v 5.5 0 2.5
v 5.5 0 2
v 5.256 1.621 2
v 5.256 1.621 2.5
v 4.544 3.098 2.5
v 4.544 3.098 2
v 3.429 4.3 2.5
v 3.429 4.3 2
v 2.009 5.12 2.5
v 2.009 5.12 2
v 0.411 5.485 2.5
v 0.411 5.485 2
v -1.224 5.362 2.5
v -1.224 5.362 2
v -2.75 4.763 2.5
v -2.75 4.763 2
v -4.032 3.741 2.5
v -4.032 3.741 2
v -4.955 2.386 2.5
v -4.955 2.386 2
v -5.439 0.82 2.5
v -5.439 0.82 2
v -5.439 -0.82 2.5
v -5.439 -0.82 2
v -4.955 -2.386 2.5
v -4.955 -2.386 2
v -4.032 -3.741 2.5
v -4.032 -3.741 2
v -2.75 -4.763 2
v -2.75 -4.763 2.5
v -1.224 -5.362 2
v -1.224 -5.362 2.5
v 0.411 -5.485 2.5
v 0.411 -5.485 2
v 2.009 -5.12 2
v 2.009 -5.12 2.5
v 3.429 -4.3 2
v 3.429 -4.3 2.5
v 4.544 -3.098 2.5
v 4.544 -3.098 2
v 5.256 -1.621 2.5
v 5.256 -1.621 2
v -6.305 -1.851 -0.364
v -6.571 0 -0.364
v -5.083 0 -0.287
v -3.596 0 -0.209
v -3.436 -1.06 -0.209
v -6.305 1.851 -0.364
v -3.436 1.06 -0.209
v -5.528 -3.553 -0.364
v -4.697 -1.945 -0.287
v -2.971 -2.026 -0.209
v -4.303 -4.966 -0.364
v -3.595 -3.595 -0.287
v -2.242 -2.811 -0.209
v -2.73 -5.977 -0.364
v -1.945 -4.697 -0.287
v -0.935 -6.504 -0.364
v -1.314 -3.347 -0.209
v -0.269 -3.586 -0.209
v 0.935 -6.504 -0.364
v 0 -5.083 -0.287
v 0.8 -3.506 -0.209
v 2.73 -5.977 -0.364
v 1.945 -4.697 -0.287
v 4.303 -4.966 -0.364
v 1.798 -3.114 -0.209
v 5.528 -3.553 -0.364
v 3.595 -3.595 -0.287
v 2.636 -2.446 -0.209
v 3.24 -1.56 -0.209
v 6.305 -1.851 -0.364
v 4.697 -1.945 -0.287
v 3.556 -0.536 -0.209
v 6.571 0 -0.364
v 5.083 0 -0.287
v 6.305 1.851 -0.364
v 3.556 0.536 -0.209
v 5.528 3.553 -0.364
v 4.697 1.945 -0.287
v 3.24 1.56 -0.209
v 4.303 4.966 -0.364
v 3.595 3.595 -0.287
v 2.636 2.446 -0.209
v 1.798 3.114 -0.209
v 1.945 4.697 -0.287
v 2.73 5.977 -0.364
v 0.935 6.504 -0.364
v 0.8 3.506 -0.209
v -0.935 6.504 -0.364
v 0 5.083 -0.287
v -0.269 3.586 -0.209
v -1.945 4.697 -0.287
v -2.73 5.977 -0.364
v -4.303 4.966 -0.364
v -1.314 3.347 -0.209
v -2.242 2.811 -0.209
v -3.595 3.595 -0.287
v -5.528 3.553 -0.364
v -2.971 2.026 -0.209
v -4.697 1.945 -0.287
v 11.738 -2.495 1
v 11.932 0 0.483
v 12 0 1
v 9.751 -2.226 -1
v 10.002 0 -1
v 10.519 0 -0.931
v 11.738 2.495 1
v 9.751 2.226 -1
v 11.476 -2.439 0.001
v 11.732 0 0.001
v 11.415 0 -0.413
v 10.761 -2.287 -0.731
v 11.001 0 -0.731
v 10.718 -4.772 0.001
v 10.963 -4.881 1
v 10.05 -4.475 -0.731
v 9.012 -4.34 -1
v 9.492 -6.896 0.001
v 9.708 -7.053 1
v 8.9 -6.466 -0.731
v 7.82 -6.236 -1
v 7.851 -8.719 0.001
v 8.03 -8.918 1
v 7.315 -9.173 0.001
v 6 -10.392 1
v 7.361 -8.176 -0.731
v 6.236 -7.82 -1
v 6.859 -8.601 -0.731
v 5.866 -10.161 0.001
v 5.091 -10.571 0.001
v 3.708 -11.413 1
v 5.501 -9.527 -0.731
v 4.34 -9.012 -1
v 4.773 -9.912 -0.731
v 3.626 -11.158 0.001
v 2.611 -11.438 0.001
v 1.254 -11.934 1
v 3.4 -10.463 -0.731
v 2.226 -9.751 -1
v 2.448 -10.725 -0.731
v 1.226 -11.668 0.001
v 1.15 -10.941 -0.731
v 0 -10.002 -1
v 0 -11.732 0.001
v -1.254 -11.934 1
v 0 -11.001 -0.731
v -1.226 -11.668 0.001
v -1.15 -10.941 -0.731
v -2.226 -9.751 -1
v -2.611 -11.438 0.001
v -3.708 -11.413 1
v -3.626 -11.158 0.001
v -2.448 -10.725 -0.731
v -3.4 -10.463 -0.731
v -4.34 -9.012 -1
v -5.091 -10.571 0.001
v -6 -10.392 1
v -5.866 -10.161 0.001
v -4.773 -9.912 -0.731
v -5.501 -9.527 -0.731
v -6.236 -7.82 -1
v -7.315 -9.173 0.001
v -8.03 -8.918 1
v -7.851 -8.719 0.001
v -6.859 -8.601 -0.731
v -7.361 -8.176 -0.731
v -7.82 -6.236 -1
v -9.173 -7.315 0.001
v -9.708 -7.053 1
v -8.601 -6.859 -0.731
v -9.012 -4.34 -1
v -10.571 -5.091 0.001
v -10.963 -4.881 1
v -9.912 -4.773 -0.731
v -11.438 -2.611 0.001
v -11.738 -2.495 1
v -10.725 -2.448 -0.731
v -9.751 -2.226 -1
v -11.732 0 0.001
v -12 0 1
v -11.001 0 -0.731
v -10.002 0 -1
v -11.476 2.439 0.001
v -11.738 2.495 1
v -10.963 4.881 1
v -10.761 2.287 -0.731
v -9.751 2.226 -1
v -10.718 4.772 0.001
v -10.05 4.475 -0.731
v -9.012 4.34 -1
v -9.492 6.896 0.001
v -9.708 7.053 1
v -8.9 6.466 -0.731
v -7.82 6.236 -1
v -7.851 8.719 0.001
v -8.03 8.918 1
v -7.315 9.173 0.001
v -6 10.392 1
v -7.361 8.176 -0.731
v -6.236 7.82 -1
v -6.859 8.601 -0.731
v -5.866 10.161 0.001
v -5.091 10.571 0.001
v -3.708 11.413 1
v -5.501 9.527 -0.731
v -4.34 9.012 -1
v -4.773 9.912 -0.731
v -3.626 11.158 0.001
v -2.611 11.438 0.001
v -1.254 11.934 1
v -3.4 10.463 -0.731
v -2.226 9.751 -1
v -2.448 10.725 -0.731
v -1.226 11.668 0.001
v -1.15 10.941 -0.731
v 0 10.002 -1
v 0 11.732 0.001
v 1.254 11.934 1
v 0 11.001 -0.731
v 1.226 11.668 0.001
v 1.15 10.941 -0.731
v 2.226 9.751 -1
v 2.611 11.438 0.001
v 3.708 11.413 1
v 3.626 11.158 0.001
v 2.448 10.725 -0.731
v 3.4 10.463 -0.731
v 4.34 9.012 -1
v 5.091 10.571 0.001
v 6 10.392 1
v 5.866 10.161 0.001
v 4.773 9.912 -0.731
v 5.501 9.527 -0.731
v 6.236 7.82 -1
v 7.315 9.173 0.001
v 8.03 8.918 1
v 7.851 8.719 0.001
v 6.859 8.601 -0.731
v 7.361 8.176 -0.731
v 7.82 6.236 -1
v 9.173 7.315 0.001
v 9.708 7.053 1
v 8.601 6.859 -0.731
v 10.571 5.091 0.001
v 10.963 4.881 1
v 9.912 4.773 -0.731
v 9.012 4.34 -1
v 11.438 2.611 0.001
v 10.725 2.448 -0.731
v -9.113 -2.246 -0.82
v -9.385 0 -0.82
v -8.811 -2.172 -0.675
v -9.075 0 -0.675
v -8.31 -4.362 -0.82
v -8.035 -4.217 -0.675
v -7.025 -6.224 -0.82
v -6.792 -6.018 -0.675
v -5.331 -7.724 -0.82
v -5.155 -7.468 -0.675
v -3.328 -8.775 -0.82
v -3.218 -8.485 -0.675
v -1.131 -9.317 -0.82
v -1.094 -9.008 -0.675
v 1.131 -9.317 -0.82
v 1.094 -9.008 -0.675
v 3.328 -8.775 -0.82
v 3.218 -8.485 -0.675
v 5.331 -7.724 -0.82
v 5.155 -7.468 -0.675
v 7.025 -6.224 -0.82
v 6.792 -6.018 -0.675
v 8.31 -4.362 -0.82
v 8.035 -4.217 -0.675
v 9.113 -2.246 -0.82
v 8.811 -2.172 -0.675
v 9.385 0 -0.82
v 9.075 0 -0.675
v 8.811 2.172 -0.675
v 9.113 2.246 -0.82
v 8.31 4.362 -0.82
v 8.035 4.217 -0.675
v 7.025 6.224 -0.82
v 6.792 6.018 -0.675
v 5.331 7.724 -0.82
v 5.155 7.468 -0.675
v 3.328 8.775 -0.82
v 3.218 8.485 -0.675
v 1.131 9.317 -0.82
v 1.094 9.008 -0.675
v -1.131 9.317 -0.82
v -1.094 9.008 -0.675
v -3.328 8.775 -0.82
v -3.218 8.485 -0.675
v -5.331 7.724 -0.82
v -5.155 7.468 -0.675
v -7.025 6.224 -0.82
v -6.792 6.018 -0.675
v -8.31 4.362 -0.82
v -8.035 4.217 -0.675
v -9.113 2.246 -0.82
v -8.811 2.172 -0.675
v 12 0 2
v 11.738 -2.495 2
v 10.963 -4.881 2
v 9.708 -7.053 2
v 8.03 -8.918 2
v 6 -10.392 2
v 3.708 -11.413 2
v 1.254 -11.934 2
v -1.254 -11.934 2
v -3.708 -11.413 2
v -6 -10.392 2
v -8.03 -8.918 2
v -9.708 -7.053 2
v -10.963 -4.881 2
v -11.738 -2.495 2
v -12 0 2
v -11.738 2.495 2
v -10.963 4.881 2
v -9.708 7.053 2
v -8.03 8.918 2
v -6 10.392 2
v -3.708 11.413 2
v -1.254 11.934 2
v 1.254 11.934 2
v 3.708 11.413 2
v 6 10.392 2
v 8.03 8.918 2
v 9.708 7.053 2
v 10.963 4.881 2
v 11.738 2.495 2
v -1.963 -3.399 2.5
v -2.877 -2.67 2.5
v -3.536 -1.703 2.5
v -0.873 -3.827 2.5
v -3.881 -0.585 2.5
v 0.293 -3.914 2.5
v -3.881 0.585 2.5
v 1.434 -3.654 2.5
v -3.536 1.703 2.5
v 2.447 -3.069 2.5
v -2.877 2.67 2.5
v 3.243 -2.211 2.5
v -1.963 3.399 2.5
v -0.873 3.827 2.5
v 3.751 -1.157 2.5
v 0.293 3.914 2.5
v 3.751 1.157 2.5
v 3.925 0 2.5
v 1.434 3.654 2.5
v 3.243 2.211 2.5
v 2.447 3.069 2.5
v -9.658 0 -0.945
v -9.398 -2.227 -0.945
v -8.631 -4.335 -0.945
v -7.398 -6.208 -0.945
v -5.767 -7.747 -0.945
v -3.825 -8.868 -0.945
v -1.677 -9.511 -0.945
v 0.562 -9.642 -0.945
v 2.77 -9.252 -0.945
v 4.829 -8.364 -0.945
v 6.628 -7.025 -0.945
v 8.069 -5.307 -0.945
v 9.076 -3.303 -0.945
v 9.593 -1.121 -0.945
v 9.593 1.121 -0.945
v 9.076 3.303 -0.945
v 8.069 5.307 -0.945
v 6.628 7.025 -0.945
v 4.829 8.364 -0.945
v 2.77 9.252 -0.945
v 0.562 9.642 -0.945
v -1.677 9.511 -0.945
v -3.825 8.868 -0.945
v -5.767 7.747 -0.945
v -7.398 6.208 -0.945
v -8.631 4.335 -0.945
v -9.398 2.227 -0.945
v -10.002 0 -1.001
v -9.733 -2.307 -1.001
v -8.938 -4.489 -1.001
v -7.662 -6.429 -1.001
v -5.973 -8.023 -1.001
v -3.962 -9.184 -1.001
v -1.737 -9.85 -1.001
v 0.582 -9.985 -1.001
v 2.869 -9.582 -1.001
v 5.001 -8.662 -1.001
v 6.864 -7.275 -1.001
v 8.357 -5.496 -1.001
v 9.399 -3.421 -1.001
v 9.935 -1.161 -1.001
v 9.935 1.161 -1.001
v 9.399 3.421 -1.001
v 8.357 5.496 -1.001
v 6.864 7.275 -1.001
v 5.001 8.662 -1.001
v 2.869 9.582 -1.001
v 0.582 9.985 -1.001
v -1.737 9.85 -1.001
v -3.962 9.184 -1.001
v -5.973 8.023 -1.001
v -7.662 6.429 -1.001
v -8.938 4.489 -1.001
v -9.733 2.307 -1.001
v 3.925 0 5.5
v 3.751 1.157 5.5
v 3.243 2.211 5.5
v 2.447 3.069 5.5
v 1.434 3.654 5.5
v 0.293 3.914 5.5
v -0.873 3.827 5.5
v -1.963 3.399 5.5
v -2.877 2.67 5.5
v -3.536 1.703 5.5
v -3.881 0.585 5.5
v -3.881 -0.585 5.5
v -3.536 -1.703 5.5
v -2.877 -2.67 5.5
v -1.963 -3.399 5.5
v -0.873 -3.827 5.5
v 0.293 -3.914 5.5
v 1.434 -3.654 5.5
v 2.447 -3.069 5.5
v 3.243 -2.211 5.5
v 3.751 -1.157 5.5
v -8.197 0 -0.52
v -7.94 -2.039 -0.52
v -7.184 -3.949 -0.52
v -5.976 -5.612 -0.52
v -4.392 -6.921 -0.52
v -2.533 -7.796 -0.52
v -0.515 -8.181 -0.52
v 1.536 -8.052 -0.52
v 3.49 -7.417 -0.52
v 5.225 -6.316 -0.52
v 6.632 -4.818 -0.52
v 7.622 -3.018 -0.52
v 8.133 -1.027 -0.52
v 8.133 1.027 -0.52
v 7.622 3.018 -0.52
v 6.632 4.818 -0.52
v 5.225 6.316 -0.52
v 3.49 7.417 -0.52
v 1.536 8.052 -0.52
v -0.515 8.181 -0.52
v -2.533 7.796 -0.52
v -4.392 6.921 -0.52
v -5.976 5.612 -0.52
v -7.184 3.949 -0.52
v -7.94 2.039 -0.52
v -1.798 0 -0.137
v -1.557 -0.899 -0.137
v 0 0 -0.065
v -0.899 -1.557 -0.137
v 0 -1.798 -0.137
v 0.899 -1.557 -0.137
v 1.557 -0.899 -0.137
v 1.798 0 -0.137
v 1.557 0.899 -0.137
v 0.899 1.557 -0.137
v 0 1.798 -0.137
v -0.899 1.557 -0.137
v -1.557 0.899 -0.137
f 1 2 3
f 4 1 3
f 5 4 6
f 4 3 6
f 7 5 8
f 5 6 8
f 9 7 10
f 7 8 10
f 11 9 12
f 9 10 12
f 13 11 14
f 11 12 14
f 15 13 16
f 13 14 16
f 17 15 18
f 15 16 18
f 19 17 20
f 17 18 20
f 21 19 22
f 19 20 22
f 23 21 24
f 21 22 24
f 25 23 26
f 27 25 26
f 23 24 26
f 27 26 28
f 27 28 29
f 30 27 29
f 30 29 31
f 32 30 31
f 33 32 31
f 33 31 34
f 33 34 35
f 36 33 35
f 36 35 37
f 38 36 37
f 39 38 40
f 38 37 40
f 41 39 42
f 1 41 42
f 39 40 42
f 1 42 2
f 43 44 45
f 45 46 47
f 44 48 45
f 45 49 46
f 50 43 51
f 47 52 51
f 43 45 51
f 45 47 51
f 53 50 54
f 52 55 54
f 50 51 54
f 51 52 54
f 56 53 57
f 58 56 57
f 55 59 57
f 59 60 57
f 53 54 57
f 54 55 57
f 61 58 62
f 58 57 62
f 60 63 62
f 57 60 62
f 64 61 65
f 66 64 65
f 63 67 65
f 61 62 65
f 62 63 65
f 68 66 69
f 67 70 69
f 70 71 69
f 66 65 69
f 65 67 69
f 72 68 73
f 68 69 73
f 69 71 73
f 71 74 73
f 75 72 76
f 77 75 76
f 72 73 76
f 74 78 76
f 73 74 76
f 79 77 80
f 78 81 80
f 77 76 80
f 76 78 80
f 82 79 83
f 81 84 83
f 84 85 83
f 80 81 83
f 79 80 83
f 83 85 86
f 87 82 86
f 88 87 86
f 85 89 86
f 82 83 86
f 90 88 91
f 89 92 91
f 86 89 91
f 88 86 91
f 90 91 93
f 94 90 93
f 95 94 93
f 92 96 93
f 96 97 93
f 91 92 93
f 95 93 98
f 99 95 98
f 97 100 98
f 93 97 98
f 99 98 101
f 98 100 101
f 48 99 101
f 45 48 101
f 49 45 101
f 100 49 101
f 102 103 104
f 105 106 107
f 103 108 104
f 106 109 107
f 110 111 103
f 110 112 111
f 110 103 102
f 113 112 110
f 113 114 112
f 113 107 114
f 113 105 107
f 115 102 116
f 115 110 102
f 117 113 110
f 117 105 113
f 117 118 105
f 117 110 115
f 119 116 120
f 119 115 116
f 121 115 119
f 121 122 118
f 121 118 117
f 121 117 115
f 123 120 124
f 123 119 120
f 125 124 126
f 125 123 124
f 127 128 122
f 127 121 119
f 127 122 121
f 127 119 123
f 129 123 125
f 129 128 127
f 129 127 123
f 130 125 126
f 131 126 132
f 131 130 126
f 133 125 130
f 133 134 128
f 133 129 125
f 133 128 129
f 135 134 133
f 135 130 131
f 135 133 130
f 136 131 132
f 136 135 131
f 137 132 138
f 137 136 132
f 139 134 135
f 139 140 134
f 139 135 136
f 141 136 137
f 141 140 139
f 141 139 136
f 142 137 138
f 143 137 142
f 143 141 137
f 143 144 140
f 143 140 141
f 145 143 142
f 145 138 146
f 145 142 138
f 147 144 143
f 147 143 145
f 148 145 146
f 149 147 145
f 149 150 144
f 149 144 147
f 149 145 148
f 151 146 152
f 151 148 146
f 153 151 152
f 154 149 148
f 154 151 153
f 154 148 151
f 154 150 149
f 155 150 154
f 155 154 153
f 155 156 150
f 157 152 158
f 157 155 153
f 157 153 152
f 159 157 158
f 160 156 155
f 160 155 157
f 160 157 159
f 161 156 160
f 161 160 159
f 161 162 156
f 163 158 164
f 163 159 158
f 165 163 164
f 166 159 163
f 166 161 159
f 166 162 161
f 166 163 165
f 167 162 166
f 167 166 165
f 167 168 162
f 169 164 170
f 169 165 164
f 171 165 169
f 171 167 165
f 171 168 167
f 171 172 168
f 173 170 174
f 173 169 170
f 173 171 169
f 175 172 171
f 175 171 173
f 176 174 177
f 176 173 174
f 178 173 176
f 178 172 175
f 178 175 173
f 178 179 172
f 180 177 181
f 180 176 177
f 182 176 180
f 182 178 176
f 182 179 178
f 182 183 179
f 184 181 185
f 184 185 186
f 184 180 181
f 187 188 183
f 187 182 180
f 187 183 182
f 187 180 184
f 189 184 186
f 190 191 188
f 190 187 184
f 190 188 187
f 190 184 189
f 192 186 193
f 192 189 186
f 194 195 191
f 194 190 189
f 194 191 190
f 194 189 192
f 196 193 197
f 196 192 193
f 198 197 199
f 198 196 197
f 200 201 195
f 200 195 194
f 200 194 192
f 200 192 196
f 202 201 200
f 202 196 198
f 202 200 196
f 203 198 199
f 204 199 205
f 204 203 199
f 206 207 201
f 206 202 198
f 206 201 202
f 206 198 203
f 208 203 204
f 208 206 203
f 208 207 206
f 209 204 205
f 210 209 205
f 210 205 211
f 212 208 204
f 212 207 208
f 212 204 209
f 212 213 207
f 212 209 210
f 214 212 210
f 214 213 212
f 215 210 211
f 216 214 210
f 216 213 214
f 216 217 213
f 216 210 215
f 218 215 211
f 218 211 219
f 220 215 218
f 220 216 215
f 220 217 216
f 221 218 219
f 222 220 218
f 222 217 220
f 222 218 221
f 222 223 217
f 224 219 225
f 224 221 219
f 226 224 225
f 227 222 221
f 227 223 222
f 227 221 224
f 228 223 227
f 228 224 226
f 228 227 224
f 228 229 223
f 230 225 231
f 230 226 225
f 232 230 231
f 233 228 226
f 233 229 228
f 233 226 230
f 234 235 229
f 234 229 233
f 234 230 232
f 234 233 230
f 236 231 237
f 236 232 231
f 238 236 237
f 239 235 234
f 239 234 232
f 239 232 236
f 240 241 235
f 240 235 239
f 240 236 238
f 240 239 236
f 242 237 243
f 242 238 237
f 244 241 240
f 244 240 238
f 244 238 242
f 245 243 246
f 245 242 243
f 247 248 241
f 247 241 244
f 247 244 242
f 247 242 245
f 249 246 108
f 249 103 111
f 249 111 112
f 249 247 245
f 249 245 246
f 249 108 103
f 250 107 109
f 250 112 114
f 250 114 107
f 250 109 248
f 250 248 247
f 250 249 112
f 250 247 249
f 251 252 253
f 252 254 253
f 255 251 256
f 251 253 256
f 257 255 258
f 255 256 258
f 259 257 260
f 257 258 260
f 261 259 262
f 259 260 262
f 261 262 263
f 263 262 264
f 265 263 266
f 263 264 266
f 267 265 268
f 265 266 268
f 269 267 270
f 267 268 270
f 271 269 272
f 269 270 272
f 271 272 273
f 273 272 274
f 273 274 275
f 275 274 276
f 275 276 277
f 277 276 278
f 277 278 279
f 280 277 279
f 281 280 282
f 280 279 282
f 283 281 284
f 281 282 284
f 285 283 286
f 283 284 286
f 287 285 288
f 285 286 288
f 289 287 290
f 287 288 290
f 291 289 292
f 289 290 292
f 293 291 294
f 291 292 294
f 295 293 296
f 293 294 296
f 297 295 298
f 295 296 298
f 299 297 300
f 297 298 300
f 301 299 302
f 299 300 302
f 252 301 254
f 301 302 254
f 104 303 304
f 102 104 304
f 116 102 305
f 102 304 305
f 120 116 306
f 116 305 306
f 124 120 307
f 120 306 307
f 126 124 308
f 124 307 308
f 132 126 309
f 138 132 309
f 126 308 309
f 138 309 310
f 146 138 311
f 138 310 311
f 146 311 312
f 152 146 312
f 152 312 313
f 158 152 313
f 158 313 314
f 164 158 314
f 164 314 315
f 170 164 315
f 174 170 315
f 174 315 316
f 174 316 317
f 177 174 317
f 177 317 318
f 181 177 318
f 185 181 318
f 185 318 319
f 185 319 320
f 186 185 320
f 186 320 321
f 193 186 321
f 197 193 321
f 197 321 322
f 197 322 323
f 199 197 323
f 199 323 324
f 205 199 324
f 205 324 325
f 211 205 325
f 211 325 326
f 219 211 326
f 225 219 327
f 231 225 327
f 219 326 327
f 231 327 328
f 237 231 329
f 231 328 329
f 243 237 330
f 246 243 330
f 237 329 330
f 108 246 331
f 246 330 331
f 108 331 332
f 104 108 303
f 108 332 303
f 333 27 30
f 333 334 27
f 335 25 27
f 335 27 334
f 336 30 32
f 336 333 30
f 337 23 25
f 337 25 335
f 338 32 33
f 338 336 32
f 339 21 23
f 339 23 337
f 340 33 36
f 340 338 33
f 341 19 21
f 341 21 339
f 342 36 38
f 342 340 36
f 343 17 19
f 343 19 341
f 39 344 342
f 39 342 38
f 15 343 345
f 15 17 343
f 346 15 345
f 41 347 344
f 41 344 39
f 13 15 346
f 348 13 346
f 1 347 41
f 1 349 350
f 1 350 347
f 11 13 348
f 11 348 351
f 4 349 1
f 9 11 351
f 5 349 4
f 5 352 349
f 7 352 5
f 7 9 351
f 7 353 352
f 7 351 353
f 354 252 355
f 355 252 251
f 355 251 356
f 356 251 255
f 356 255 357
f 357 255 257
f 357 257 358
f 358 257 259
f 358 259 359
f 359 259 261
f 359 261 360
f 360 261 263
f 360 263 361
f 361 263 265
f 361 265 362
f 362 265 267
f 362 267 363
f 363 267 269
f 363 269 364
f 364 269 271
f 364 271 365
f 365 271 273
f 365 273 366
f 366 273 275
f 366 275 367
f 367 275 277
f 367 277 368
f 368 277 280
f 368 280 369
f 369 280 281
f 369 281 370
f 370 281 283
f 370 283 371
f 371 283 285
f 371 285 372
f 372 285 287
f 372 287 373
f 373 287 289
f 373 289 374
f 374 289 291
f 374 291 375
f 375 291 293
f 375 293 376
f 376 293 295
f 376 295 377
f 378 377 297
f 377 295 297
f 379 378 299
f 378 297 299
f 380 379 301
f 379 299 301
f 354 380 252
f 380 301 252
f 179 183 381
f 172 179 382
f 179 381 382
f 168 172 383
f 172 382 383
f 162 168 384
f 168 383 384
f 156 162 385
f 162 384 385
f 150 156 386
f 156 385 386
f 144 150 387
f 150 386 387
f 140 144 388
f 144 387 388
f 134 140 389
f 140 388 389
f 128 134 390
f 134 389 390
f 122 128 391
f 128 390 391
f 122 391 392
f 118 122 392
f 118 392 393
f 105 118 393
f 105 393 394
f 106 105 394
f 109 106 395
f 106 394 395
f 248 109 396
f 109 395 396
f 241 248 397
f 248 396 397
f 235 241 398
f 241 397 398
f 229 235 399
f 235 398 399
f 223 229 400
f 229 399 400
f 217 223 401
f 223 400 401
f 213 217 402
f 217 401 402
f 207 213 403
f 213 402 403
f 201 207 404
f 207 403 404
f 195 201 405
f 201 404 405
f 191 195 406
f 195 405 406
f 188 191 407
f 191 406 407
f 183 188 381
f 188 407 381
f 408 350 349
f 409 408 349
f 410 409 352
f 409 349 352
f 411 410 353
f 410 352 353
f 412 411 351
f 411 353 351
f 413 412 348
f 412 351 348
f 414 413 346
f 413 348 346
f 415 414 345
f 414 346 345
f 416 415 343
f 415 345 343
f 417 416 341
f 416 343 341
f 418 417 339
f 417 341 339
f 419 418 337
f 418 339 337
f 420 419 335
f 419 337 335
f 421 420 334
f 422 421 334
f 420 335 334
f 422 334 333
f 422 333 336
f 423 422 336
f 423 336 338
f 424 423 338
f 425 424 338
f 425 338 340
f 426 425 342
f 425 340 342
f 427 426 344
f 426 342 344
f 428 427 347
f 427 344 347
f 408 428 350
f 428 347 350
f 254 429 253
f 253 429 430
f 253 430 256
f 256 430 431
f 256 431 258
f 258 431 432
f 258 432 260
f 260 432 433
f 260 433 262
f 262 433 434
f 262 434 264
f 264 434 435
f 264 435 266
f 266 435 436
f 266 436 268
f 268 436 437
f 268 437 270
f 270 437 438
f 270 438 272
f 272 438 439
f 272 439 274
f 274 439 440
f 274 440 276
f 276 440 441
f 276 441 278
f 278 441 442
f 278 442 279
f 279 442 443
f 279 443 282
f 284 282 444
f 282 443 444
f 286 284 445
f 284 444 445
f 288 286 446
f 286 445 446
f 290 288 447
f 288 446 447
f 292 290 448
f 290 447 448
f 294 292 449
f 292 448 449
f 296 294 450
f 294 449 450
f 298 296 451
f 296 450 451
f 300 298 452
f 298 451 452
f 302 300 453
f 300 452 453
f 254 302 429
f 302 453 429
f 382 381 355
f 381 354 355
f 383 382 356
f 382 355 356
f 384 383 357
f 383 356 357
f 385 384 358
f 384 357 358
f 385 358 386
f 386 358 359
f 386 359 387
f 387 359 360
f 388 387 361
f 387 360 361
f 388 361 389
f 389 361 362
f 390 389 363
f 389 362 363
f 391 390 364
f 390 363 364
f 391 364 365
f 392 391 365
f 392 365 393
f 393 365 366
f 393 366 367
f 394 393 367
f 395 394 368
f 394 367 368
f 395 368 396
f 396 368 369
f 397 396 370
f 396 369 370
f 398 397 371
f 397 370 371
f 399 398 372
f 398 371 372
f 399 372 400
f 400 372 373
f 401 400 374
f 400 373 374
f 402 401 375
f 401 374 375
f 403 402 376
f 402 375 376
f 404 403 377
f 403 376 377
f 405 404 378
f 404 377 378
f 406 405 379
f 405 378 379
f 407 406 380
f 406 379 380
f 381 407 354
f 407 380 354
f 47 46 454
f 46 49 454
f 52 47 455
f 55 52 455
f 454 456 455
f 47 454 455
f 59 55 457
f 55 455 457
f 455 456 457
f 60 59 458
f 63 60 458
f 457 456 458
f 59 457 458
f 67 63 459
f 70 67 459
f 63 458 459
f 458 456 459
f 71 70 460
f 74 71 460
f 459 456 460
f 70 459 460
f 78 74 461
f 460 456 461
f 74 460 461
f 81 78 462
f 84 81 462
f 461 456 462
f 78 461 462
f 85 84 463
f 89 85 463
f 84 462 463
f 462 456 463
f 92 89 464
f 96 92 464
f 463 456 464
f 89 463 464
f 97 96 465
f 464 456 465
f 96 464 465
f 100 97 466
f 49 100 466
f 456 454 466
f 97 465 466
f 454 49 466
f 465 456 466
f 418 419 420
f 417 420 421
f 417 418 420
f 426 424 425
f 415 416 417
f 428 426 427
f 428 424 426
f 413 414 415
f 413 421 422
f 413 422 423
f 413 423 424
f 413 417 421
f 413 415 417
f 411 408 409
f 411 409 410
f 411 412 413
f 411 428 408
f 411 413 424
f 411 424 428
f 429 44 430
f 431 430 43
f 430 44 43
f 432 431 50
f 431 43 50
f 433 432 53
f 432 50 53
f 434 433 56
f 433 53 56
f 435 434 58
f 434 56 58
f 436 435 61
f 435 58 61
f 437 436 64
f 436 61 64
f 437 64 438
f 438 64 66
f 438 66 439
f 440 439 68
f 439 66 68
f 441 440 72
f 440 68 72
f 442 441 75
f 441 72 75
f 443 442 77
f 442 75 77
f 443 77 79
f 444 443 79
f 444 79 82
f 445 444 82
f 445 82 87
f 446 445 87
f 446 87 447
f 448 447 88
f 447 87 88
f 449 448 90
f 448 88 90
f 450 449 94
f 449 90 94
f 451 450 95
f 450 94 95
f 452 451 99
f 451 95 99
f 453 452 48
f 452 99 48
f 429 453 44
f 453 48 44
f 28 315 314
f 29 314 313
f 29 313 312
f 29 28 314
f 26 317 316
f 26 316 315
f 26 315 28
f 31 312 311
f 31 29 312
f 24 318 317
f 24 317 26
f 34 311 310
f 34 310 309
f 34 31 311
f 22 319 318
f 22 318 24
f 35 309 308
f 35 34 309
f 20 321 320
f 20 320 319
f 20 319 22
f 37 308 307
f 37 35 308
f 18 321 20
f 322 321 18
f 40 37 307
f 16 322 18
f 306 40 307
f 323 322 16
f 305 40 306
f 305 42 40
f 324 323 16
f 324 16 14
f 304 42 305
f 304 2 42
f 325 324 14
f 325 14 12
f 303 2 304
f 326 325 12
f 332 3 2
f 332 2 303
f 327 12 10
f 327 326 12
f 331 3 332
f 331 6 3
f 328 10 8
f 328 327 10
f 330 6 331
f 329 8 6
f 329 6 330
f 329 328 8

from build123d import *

# Parameters (mm, degrees)
F0_R     = 12
F1_DEPTH = 2
F2_R     = 12
F2_R_2   = 10
F3_DEPTH = 1
F4_R     = 1.99999
F5_R     = 5.5
F6_DEPTH = 0.5
F7_R     = 3.925
F8_DEPTH = 3


# Not quite as in the source:
# - a fillet or chamfer is up to 0.001 mm smaller than in the source, because OpenCascade refuses the exact size


with BuildPart() as f1:
    # F0 (on Top) → F1 (new body)
    with BuildSketch(Plane.XY):
        Circle(F0_R)
    extrude(amount=F1_DEPTH)

    # F2 (on face) → F3 (join)
    with BuildSketch(Plane(origin=(0, 0, 0), x_dir=(1, 0, 0), z_dir=(0, 0, -1))):
        Circle(F2_R)
        Circle(F2_R_2, mode=Mode.SUBTRACT)
    extrude(amount=F3_DEPTH)

    # F4 (radius 2 in the source; OpenCascade refuses exactly that, so slightly less here)
    f4_edges = [f1.edges().sort_by_distance(p)[0] for p in [
        (-12, 0, -1),
    ]]
    fillet(f4_edges, radius=F4_R)

    # F5 (on face) → F6 (join)
    with BuildSketch(Plane.XY.offset(2)):
        Circle(F5_R)
    extrude(amount=F6_DEPTH)

    # F7 (on face) → F8 (join)
    with BuildSketch(Plane.XY.offset(2.5)):
        Circle(F7_R)
    extrude(amount=F8_DEPTH)

    # F9 (on Front) → F10 (revolve)
    with BuildSketch(Plane.XZ):
        Polygon((-10.0021678954, 0), (-10.0021678954, -1.0005384684), (-9.6580199897, -0.9450307698), (-9.385343641, -0.8195927949), (-9.0745007619, -0.6752727786), (-8.19747895, -0.5198512226), (-6.5711033531, -0.3644296667), (-3.5958907101, -0.2090081107), (0, -0.0646880944), (0, 0), align=None)
    revolve(axis=Axis((0, 0, -0.0323440472), (0, 0, 1)))


solid = f1.part
